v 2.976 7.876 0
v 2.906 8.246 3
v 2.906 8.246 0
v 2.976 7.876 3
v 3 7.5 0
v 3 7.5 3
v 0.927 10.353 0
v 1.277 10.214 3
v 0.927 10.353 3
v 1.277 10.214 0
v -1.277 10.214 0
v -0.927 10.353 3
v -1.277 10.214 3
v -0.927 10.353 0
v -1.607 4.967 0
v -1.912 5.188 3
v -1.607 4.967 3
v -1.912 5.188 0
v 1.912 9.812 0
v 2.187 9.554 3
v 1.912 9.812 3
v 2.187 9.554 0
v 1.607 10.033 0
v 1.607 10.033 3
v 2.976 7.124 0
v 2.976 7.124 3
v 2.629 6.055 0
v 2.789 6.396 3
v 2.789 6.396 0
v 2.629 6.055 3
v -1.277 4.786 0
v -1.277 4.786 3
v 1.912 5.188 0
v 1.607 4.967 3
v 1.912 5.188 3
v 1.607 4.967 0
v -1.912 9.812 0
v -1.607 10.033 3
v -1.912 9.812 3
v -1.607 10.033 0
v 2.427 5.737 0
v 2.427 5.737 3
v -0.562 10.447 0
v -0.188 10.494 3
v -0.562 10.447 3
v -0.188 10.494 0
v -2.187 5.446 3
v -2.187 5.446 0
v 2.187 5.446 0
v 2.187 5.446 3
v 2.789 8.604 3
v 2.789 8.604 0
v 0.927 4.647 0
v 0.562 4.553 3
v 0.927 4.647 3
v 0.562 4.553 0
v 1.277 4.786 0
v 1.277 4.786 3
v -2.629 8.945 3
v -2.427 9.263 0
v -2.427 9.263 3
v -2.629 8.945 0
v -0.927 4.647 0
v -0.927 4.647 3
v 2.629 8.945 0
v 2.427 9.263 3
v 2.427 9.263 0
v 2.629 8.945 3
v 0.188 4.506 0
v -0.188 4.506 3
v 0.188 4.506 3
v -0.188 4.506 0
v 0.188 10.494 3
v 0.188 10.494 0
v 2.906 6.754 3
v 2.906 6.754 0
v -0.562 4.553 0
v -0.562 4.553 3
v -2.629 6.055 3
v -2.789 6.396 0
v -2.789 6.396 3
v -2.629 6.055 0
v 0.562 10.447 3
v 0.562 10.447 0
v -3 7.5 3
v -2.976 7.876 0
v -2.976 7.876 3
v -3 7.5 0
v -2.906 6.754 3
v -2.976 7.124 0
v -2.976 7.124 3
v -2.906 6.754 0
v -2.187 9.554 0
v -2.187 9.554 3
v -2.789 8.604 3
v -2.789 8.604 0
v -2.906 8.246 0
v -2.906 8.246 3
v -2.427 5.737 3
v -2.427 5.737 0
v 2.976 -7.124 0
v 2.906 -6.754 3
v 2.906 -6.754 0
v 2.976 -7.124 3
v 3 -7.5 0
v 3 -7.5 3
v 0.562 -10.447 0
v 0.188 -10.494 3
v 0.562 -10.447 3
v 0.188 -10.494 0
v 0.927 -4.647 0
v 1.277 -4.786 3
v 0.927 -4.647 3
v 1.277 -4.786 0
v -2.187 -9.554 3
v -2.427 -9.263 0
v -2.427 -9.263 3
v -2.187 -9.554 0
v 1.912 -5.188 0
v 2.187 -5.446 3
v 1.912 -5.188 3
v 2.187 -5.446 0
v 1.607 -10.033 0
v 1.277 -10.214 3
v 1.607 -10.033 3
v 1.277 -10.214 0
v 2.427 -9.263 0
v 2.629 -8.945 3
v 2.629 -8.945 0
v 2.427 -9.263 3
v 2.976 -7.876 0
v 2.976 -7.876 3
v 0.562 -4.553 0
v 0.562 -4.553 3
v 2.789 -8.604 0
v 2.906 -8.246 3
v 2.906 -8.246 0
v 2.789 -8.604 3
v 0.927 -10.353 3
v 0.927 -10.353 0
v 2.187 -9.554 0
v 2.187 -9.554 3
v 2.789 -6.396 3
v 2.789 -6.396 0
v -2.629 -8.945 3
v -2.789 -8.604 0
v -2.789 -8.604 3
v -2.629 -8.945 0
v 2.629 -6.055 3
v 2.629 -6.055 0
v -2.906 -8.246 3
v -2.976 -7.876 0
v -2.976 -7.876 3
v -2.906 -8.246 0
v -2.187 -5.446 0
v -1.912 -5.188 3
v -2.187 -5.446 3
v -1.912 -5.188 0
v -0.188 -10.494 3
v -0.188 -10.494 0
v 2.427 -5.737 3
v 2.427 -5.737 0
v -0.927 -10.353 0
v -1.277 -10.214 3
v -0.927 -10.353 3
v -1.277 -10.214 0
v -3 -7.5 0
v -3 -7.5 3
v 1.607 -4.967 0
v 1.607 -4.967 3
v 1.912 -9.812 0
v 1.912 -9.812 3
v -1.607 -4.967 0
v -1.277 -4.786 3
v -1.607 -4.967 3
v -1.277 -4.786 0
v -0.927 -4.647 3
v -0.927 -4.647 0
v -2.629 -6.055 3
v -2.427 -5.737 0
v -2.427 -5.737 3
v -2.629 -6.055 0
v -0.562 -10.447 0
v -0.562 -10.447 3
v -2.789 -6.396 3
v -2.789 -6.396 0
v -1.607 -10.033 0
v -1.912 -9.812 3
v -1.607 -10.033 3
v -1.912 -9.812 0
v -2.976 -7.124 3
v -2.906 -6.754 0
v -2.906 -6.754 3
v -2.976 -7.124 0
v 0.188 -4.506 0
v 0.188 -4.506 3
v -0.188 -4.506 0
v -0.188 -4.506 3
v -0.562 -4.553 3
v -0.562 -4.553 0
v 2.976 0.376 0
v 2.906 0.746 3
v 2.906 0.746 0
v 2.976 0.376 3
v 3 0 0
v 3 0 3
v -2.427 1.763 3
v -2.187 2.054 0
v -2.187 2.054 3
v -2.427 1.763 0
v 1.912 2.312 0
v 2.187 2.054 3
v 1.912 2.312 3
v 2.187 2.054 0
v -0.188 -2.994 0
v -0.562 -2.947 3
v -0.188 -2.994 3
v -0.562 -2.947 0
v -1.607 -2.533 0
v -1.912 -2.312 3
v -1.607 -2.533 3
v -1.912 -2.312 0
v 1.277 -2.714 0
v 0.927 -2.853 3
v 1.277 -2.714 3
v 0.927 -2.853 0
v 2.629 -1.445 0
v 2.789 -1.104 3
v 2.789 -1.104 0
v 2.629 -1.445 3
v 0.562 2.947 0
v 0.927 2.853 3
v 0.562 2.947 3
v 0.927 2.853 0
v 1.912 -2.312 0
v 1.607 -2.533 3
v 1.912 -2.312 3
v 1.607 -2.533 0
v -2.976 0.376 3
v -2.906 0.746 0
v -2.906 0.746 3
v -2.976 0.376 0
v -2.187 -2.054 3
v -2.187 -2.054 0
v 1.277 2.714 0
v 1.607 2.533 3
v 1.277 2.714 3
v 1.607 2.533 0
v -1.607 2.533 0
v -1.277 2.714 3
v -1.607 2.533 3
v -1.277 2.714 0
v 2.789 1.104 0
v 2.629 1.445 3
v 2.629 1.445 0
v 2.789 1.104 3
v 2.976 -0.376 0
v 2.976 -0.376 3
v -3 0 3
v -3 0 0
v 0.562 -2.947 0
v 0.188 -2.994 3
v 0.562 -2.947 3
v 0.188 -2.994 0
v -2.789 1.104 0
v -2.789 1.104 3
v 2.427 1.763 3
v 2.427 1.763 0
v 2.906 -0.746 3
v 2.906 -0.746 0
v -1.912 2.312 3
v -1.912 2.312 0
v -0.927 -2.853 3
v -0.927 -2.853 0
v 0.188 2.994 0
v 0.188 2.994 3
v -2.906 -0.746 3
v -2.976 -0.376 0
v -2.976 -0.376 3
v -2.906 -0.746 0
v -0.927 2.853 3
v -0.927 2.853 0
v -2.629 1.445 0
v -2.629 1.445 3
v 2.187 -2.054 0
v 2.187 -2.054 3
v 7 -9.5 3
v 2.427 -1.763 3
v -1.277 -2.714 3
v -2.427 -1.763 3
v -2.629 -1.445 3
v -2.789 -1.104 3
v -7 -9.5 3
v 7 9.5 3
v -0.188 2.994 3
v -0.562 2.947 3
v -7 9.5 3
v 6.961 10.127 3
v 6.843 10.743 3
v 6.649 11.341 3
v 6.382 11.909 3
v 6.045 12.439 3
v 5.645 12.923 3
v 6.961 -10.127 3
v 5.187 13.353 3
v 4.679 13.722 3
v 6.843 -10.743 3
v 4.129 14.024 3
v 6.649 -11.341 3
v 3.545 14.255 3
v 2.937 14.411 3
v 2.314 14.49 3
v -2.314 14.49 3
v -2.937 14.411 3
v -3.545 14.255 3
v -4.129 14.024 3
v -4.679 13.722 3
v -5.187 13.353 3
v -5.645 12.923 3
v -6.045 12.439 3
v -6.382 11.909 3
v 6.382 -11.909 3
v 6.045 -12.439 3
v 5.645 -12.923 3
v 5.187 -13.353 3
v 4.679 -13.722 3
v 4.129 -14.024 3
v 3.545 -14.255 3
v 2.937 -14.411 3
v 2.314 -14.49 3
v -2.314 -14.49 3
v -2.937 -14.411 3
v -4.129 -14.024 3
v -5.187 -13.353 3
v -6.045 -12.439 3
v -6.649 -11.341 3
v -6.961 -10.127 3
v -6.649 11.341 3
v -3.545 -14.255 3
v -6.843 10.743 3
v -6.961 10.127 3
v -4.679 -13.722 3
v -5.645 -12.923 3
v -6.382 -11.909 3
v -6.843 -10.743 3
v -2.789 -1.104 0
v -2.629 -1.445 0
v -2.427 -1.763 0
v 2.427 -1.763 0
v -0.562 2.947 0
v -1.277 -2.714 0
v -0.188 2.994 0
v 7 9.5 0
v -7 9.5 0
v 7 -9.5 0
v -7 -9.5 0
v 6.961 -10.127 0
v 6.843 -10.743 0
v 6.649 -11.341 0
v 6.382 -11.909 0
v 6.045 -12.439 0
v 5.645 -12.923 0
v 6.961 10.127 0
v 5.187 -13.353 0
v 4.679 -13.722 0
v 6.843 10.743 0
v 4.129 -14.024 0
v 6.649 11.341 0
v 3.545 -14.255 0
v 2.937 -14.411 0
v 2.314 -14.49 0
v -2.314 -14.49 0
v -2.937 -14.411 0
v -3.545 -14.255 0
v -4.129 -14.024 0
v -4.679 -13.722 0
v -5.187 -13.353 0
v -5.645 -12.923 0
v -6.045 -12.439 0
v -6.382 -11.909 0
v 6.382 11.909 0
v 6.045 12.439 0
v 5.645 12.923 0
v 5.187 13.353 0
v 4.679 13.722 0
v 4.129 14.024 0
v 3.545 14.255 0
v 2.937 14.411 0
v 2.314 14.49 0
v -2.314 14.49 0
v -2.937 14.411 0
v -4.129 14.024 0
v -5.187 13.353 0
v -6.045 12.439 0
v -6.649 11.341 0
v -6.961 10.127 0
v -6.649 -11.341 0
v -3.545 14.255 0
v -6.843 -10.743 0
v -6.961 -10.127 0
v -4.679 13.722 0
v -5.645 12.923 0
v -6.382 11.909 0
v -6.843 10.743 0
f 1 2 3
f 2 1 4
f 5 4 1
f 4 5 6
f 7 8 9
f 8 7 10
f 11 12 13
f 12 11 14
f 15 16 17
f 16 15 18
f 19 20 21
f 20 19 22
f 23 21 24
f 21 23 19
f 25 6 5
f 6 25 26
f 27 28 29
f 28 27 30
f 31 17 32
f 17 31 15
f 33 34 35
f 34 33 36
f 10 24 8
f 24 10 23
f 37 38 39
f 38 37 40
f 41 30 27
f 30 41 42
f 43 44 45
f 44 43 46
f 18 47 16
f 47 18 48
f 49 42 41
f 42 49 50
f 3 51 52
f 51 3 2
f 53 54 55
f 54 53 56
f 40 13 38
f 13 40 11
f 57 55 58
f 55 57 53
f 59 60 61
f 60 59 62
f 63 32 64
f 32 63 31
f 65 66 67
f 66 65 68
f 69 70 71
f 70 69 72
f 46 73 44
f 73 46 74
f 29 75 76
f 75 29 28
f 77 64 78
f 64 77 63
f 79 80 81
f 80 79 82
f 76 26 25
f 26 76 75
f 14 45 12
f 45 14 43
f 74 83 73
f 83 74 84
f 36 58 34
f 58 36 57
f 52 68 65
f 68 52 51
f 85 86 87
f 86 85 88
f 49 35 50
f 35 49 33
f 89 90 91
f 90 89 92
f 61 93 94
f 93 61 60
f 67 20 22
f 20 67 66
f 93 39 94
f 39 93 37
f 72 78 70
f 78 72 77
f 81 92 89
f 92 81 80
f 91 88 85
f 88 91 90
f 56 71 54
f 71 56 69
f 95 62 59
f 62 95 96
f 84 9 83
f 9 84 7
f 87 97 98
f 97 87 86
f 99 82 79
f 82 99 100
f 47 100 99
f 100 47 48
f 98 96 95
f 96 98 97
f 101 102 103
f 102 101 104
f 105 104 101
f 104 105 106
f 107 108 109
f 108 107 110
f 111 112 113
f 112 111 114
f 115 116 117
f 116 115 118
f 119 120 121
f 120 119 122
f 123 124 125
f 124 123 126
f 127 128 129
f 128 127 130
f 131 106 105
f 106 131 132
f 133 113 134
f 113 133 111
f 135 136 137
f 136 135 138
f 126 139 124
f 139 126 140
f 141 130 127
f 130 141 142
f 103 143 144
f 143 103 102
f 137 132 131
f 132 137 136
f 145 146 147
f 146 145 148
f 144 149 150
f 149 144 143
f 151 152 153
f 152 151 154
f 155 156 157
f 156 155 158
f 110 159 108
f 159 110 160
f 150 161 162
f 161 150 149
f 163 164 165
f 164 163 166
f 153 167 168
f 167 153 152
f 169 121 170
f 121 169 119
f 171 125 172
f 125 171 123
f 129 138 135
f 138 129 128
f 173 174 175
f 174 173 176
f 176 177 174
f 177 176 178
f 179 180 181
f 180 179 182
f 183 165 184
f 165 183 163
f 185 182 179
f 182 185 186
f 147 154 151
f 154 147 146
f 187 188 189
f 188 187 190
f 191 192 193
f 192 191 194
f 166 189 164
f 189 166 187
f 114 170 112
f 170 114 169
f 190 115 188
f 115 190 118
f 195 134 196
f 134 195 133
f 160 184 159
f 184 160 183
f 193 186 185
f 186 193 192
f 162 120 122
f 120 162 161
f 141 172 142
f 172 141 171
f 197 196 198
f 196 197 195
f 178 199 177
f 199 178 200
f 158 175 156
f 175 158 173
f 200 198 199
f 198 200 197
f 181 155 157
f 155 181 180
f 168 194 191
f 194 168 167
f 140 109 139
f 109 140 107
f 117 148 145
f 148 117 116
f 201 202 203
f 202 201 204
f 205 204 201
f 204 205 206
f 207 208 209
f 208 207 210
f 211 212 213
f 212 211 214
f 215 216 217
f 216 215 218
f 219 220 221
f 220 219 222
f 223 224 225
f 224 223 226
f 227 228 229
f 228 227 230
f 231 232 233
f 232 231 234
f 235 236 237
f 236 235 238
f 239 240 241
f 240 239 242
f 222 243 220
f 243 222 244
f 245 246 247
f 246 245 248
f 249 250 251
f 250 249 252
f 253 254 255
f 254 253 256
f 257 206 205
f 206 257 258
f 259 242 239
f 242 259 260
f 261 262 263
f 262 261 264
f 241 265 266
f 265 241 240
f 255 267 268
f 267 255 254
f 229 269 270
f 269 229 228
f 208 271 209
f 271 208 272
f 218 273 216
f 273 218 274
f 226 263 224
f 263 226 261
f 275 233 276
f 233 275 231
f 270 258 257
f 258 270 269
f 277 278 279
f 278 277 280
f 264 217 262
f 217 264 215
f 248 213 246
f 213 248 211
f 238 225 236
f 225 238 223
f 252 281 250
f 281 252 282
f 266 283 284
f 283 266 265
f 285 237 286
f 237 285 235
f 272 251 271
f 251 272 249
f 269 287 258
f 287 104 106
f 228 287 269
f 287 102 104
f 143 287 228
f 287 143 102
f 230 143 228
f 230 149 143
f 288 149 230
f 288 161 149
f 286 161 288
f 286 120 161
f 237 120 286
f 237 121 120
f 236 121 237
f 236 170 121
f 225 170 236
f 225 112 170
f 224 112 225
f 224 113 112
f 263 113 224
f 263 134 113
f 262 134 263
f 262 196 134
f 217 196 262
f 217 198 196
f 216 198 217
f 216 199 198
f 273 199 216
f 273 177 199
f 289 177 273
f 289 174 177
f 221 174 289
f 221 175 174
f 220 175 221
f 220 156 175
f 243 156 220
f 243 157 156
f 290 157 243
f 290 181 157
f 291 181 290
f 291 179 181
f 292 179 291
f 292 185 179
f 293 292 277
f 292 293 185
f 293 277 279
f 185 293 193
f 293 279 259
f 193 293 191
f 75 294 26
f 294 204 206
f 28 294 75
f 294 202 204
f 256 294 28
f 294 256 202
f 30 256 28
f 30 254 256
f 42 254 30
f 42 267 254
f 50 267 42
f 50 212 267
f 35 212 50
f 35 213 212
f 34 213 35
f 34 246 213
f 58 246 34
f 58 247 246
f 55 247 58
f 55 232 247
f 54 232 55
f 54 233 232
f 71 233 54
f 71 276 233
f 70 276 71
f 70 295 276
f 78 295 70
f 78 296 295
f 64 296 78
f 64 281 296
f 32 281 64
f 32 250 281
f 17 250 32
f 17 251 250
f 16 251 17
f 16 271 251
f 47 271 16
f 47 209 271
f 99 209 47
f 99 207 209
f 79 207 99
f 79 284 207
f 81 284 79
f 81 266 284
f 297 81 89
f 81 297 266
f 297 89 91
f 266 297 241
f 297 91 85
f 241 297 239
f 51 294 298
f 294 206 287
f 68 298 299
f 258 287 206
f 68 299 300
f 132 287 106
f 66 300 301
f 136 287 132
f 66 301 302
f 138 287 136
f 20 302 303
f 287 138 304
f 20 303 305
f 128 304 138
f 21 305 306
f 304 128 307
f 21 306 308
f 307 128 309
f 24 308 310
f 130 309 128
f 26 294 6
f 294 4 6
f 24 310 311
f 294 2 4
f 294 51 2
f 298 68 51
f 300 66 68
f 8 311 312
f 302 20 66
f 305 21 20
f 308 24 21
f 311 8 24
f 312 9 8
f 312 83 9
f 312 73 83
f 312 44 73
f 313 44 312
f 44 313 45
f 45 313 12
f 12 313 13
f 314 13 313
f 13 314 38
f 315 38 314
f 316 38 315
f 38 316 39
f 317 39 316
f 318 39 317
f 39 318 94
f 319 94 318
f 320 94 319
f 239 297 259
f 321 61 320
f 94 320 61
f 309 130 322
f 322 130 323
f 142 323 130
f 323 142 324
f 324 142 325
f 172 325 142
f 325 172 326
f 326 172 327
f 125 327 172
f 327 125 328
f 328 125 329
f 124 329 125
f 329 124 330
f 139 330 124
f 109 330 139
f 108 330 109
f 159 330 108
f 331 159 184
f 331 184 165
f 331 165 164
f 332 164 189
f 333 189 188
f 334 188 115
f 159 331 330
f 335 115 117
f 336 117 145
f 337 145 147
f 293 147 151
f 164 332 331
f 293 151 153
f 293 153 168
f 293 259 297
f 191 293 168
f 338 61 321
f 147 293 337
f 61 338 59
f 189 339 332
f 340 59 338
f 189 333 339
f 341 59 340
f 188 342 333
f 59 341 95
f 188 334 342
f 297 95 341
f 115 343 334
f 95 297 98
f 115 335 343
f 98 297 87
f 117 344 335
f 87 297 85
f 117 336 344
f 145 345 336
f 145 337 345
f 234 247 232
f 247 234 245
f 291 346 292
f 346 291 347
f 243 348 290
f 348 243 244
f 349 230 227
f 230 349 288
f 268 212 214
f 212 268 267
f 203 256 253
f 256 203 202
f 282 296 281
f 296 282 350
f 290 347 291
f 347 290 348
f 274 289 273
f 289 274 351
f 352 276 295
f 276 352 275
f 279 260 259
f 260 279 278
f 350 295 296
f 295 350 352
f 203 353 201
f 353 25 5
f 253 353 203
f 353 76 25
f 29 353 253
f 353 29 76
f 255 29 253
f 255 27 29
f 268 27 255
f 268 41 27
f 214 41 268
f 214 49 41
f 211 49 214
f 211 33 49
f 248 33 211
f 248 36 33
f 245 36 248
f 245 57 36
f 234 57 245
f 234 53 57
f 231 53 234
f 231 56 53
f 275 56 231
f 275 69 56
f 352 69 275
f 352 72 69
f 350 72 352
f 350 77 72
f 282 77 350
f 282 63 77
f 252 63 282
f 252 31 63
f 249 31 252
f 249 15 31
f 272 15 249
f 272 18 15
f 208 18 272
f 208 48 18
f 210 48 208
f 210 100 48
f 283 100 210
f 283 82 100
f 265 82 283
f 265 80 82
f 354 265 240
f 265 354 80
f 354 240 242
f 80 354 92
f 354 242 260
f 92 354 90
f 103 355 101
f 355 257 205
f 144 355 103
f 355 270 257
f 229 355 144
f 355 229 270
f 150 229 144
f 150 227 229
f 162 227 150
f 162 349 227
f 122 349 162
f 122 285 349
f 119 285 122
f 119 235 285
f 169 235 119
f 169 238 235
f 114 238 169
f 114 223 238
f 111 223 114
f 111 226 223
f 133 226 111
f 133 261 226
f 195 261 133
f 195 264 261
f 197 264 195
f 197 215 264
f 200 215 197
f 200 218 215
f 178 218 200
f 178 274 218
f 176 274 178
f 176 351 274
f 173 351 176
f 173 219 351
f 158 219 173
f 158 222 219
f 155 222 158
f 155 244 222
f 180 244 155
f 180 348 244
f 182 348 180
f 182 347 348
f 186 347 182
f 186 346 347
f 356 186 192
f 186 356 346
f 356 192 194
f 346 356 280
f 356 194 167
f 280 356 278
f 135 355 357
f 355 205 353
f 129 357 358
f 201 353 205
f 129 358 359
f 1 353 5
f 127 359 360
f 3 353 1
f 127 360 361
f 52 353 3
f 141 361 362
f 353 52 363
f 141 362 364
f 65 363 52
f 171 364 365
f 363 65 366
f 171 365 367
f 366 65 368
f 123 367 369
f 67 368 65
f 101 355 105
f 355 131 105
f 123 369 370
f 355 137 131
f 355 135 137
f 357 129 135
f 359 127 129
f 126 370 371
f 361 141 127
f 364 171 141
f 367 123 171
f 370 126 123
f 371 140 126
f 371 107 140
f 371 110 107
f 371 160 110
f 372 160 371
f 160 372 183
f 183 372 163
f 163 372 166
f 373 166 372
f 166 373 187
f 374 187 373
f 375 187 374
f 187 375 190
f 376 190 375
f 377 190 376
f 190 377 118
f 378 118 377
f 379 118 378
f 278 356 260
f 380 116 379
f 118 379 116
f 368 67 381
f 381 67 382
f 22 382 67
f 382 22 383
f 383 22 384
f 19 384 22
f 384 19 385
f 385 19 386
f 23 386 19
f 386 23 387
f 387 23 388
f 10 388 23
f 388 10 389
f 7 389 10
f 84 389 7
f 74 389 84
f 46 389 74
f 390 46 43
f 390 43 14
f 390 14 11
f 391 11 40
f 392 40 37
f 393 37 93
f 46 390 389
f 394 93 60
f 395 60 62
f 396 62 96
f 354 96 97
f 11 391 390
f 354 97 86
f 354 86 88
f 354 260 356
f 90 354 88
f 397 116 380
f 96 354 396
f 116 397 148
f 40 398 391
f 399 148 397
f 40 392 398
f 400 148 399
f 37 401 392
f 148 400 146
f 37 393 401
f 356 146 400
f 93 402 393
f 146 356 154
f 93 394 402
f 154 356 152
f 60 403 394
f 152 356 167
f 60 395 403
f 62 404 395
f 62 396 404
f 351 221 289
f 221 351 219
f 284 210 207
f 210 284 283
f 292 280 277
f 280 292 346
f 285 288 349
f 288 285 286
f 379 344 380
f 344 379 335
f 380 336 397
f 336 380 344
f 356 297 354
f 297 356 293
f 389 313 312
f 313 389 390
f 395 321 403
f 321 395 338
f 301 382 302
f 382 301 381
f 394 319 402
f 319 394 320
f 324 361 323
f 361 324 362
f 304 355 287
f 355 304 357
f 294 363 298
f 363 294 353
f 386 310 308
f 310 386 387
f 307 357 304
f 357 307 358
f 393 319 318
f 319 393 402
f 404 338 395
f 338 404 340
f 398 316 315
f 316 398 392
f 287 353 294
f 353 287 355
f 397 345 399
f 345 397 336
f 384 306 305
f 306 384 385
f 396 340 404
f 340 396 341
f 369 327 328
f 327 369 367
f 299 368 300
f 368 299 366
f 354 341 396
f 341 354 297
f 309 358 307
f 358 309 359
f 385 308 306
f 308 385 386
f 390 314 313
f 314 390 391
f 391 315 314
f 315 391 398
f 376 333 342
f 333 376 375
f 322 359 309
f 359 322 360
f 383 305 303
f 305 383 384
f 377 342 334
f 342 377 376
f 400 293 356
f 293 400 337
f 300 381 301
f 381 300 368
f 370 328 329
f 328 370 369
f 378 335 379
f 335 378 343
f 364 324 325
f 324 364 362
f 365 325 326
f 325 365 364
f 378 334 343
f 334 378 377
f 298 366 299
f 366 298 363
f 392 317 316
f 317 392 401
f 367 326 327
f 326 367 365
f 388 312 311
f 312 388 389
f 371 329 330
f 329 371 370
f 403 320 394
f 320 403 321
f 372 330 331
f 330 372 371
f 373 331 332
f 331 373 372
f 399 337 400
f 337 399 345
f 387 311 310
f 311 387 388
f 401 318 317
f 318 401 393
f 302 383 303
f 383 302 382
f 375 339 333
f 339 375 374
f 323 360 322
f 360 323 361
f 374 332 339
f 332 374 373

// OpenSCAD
$fn = 50;


difference() {
	union() {
		hull() {
			translate(v = [-2.0000000000, 9.5000000000, 0]) {
				cylinder(h = 3, r = 5);
			}
			translate(v = [2.0000000000, 9.5000000000, 0]) {
				cylinder(h = 3, r = 5);
			}
			translate(v = [-2.0000000000, -9.5000000000, 0]) {
				cylinder(h = 3, r = 5);
			}
			translate(v = [2.0000000000, -9.5000000000, 0]) {
				cylinder(h = 3, r = 5);
			}
		}
	}
	union() {
		#translate(v = [0.0000000000, 7.5000000000, 0]) {
			cylinder(h = 3, r = 3.0000000000);
		}
		#translate(v = [0.0000000000, -7.5000000000, 0]) {
			cylinder(h = 3, r = 3.0000000000);
		}
		#translate(v = [0.0000000000, -7.5000000000, -100.0000000000]) {
			cylinder(h = 200, r = 3.0000000000);
		}
		#translate(v = [0.0000000000, -7.5000000000, -100.0000000000]) {
			cylinder(h = 200, r = 3.0000000000);
		}
		#translate(v = [0.0000000000, 7.5000000000, -100.0000000000]) {
			cylinder(h = 200, r = 3.0000000000);
		}
		#translate(v = [0.0000000000, 7.5000000000, -100.0000000000]) {
			cylinder(h = 200, r = 3.0000000000);
		}
		#translate(v = [0.0000000000, 7.5000000000, 0]) {
			cylinder(h = 3, r = 1.5000000000);
		}
		#translate(v = [0.0000000000, -7.5000000000, 0]) {
			cylinder(h = 3, r = 1.5000000000);
		}
		#translate(v = [0.0000000000, 7.5000000000, 0]) {
			cylinder(h = 3, r = 1.5000000000);
		}
		#translate(v = [0.0000000000, -7.5000000000, 0]) {
			cylinder(h = 3, r = 1.5000000000);
		}
		#translate(v = [0.0000000000, 7.5000000000, 0]) {
			cylinder(h = 3, r = 1.5000000000);
		}
		#translate(v = [0.0000000000, -7.5000000000, 0]) {
			cylinder(h = 3, r = 1.5000000000);
		}
		#cylinder(h = 3, r = 3.0000000000);
	}
}
